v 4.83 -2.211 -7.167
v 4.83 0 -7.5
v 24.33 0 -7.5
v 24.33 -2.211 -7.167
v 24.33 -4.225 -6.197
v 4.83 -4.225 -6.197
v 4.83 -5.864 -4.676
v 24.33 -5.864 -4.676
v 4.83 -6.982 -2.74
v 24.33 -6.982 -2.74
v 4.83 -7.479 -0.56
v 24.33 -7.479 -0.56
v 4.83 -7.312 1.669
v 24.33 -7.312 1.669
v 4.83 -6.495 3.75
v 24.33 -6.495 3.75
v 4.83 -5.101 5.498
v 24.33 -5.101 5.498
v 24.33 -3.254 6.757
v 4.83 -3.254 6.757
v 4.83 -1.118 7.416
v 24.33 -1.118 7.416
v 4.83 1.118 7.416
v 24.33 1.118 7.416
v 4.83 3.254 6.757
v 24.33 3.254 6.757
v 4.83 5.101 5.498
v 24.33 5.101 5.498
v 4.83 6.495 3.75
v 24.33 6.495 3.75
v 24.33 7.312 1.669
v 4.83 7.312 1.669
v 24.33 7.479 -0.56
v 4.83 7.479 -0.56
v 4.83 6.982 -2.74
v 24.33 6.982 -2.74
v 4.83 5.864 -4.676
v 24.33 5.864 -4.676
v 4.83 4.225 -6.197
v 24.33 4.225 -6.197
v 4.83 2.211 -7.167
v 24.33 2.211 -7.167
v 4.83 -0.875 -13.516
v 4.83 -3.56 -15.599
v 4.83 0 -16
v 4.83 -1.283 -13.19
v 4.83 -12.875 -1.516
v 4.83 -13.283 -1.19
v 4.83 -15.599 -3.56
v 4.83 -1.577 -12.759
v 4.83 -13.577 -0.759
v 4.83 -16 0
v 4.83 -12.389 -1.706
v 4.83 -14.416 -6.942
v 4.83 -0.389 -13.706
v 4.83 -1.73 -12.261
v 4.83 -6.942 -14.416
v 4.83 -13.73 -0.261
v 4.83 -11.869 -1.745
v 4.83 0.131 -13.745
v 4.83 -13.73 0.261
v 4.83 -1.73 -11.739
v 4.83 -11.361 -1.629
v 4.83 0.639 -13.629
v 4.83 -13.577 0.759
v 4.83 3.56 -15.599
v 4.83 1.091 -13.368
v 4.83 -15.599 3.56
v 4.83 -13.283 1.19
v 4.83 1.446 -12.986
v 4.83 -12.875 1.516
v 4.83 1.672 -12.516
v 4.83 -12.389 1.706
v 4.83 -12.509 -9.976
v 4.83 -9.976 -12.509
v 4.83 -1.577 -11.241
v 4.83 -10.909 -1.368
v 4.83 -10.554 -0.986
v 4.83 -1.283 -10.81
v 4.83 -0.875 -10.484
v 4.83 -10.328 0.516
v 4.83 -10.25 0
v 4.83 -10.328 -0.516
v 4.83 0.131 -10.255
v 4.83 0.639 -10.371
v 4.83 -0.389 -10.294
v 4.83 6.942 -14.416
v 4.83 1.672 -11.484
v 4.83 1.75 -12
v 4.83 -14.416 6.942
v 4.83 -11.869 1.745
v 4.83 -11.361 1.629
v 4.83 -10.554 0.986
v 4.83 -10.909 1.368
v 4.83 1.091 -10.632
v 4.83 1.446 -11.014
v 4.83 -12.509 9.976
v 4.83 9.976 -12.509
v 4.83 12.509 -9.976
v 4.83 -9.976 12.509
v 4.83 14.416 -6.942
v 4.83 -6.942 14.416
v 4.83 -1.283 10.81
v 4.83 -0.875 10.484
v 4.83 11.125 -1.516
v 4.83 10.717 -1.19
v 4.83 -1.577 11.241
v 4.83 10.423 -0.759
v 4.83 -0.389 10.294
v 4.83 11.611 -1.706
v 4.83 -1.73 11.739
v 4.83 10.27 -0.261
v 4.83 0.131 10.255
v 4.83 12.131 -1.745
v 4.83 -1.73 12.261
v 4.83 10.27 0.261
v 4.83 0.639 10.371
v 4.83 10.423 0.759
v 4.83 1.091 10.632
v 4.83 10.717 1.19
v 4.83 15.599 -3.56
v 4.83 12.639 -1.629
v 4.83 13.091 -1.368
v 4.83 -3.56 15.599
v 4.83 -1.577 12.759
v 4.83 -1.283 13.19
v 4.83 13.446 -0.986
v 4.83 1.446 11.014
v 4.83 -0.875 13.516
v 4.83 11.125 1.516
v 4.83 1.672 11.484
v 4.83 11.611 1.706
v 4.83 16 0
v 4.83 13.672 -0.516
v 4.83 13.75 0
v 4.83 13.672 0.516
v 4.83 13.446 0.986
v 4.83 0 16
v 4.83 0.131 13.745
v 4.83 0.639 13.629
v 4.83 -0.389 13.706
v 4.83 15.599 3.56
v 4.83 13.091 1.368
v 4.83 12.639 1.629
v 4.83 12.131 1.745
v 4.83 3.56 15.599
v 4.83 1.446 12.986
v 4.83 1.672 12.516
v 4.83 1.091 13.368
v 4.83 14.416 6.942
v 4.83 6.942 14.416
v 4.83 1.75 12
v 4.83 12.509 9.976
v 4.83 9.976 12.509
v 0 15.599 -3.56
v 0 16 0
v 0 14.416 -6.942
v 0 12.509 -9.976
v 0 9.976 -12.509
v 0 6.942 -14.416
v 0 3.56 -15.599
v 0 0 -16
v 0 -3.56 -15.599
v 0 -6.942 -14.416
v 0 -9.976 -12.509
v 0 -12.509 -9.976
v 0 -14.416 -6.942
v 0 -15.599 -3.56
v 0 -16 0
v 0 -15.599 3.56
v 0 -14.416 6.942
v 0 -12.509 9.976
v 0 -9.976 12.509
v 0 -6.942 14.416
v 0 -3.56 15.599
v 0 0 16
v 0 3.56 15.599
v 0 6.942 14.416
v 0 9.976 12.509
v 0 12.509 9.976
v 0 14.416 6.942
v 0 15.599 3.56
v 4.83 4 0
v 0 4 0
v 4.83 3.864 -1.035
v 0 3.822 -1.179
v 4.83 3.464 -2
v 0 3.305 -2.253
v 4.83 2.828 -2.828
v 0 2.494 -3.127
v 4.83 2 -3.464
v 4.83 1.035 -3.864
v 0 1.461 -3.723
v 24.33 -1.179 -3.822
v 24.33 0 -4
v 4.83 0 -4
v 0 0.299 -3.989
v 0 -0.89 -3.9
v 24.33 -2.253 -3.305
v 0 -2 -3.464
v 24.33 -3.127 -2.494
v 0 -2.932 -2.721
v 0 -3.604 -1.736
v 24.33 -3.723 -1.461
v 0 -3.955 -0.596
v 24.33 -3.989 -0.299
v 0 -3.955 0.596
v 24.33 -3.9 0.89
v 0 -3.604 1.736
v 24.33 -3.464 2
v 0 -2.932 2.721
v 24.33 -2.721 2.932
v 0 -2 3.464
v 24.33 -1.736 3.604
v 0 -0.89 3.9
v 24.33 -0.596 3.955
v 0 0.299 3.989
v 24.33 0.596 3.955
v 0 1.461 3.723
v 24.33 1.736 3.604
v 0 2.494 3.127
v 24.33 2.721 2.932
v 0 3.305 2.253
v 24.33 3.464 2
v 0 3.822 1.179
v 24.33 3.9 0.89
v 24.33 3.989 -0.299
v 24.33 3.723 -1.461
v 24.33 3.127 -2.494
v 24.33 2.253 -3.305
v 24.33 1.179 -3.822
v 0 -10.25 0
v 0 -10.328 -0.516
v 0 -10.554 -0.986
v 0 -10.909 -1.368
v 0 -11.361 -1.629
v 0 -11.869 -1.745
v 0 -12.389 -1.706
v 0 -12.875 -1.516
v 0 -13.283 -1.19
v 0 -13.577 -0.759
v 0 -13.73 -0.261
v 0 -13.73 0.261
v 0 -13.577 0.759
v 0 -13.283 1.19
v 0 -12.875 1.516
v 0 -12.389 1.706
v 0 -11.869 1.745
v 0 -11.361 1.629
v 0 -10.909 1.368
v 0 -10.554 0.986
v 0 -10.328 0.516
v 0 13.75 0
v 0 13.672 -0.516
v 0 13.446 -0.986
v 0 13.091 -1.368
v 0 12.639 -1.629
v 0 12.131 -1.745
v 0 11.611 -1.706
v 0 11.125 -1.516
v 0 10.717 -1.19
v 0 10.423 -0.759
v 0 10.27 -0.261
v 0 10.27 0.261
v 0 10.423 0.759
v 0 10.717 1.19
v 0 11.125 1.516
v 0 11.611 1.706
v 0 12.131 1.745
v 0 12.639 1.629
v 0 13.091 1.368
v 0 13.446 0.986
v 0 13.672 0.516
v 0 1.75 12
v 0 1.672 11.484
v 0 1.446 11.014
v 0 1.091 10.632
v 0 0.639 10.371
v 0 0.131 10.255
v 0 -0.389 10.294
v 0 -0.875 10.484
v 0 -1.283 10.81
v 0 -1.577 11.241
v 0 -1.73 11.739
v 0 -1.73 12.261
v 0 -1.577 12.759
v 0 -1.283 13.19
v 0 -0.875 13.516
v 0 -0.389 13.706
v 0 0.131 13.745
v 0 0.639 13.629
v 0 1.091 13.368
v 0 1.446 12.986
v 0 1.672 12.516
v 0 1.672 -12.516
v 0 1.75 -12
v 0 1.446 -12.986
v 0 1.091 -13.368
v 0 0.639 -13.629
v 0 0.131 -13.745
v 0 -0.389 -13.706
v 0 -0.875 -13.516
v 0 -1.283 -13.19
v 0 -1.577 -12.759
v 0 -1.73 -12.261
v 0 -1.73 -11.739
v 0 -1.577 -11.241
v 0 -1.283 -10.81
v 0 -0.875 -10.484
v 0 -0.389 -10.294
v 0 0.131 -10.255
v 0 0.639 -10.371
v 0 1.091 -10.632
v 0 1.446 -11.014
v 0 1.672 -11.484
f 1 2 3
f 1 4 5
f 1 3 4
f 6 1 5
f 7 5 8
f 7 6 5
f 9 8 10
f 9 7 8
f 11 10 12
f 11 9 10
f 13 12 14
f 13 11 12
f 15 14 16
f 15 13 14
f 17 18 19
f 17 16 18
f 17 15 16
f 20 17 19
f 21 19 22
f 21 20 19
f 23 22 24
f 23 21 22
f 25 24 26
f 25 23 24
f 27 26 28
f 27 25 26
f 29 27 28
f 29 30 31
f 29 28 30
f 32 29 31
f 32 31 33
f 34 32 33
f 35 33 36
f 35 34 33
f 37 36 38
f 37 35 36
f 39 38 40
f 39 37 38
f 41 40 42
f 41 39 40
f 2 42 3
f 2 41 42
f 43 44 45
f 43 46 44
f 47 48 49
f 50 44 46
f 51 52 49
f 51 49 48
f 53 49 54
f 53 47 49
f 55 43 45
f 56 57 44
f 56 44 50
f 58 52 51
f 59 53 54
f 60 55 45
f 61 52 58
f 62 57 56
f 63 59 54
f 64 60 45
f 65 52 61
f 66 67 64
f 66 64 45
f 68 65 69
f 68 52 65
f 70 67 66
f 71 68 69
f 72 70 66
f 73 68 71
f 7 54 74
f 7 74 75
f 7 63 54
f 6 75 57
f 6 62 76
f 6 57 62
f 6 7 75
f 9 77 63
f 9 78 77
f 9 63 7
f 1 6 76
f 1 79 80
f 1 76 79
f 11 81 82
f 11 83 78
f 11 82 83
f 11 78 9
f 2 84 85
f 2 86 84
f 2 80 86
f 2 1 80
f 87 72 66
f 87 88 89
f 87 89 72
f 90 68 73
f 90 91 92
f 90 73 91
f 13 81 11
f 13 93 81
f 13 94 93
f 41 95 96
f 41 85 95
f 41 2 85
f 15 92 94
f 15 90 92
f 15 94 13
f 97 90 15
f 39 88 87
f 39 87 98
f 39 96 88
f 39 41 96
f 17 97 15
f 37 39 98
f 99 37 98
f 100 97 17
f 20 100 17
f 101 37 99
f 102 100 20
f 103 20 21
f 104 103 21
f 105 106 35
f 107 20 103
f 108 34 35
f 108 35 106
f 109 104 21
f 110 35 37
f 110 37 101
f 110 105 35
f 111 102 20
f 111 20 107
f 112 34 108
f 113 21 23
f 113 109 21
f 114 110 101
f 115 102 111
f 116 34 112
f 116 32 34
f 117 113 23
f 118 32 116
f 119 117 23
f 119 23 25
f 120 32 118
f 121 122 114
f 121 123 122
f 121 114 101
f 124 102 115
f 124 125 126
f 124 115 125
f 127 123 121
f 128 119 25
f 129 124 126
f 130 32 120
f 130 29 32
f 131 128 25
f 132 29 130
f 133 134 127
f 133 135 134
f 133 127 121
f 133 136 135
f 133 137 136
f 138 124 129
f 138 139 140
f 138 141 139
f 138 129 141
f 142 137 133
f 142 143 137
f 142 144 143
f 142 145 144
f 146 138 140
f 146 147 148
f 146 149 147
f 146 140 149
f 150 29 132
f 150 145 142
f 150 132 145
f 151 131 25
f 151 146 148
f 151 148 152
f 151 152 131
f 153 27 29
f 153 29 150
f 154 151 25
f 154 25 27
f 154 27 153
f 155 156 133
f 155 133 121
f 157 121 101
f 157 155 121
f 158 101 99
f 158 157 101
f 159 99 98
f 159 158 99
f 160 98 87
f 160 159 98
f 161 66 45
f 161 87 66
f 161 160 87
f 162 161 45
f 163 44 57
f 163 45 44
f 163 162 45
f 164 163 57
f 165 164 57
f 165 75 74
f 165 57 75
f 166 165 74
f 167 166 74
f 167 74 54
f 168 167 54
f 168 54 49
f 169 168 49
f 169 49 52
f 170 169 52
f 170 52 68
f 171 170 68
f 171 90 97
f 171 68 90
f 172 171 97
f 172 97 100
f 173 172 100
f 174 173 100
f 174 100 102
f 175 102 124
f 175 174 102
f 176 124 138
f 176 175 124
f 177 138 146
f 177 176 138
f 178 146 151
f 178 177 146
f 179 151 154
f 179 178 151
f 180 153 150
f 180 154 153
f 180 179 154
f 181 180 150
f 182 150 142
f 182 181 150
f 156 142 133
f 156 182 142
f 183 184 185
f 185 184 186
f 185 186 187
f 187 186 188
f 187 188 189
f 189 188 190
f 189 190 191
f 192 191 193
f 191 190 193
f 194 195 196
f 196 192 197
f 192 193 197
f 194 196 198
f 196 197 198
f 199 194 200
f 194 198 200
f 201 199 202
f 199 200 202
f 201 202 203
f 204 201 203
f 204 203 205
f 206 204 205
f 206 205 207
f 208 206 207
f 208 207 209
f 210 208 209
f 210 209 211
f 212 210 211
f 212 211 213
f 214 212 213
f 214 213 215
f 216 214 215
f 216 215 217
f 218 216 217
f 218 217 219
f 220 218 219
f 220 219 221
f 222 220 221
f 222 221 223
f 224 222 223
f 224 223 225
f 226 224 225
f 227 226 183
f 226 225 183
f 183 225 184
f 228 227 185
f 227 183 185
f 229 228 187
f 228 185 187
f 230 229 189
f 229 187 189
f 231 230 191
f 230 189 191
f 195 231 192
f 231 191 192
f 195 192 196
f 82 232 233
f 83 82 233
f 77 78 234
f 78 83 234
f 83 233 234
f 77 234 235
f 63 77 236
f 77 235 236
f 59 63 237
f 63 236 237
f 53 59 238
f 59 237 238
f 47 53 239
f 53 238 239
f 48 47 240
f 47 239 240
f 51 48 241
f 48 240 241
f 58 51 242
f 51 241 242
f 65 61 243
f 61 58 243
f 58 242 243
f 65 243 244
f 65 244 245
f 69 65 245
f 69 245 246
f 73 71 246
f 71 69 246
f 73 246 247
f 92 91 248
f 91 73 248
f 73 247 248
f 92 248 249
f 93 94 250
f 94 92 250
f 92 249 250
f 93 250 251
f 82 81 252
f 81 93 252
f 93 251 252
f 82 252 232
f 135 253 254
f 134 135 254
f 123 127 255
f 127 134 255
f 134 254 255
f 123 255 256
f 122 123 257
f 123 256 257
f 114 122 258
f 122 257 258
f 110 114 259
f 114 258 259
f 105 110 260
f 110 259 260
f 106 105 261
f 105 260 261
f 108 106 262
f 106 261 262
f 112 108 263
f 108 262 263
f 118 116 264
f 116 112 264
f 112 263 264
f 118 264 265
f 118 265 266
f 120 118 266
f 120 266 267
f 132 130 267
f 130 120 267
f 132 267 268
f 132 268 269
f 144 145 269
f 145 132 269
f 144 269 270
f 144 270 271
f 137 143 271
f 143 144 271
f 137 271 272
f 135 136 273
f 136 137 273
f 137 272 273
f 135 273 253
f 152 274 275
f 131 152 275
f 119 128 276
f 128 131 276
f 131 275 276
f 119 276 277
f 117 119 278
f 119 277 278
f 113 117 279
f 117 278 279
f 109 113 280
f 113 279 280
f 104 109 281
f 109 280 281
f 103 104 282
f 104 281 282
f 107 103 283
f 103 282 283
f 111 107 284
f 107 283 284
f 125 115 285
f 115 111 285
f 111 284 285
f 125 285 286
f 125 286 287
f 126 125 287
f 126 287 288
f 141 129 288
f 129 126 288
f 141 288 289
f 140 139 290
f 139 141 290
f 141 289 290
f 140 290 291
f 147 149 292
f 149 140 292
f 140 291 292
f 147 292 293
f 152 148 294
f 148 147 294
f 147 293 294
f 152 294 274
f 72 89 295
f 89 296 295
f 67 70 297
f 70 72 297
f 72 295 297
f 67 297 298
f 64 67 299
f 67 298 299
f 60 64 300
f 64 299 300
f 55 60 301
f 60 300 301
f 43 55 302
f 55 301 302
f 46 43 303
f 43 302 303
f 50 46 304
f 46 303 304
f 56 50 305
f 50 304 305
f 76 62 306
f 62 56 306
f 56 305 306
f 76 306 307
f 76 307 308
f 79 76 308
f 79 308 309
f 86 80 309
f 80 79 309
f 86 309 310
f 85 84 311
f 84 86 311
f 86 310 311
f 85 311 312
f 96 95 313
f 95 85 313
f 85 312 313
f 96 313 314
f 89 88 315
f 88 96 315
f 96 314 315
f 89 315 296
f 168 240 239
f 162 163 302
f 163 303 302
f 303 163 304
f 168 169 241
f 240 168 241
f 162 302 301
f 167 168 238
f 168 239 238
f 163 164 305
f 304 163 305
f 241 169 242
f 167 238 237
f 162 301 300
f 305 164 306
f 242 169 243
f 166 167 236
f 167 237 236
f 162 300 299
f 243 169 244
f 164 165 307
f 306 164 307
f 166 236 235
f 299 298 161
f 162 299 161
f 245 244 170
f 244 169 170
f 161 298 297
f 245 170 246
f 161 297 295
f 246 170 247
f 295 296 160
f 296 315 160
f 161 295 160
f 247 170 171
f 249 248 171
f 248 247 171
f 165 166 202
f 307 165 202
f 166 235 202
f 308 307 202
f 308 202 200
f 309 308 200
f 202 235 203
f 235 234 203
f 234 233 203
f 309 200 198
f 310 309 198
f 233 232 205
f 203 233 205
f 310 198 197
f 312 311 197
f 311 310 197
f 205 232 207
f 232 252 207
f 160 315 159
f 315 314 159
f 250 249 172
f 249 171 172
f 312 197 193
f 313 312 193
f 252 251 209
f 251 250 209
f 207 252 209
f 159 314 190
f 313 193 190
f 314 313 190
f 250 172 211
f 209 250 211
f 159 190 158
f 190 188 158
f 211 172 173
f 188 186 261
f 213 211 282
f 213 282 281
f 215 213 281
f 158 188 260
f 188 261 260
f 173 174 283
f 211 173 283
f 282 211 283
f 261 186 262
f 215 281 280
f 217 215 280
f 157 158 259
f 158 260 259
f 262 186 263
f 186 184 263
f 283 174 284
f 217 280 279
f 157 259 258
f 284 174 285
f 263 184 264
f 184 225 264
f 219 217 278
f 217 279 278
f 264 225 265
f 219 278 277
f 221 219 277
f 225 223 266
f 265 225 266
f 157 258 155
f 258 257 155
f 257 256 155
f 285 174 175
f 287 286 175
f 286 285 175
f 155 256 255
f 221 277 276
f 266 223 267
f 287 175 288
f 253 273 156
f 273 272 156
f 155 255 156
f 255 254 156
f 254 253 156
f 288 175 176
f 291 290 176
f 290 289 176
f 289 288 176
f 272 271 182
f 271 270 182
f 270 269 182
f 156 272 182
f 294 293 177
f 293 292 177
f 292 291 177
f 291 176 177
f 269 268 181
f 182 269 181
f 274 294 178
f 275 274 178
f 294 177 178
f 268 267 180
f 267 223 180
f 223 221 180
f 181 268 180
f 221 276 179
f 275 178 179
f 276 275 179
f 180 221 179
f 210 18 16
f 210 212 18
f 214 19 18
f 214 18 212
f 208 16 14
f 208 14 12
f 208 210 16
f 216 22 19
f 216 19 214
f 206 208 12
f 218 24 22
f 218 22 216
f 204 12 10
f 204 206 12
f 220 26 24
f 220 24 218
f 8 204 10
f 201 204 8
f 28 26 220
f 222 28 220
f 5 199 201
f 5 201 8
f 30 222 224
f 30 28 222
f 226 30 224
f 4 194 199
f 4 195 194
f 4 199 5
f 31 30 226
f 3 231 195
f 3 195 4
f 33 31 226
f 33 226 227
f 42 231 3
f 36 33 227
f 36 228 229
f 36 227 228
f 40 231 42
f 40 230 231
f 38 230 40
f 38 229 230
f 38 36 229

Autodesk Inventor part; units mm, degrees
ref_plane "YZ Plane" through (0, 0, 0) normal (1, 0, 0) x (0, 1, 0)
ref_plane "XZ Plane" through (0, 0, 0) normal (0, 1, 0) x (-1, 0, 0)
ref_plane "XY Plane" through (0, 0, 0) normal (0, 0, 1) x (1, 0, 0)
sketch "Sketch1" plane through (0, 0, 0) normal (1, 0, 0) x (0, 1, 0)
  circle A0 centre (0, 0) radius 16
  circle A1 centre (-12, 0) radius 1.75
  circle A2 centre (0, -12) radius 1.75
  circle A3 centre (12, 0) radius 1.75
  circle A4 centre (0, 12) radius 1.75
  circle A5 centre (0, 0) radius 7.5
  circle A6 centre (0, 0) radius 4
  dimension "d0" = 32
  dimension "d1" = 3.5
  dimension "d4" = 360
  dimension "d6" = 24
  dimension "d7" = 15
  dimension "d8" = 8
  dimension "d14" = 12
extrude "Extrusion1" add sketch "Sketch1" along normal blind 4.83 contours A0 | A5
sketch "Sketch2" plane through (4.83, 0, 0) normal (1, 0, 0) x (0, 0, -1)
  circle A0 centre (0, 0) radius 4 projected
  circle A1 centre (0, 0) radius 7.5
  point P0 (0, 0)
  dimension "d11" = 15
extrude "Extrusion2" add sketch "Sketch2" along normal blind 19.5
properties part number "linear bearing"
